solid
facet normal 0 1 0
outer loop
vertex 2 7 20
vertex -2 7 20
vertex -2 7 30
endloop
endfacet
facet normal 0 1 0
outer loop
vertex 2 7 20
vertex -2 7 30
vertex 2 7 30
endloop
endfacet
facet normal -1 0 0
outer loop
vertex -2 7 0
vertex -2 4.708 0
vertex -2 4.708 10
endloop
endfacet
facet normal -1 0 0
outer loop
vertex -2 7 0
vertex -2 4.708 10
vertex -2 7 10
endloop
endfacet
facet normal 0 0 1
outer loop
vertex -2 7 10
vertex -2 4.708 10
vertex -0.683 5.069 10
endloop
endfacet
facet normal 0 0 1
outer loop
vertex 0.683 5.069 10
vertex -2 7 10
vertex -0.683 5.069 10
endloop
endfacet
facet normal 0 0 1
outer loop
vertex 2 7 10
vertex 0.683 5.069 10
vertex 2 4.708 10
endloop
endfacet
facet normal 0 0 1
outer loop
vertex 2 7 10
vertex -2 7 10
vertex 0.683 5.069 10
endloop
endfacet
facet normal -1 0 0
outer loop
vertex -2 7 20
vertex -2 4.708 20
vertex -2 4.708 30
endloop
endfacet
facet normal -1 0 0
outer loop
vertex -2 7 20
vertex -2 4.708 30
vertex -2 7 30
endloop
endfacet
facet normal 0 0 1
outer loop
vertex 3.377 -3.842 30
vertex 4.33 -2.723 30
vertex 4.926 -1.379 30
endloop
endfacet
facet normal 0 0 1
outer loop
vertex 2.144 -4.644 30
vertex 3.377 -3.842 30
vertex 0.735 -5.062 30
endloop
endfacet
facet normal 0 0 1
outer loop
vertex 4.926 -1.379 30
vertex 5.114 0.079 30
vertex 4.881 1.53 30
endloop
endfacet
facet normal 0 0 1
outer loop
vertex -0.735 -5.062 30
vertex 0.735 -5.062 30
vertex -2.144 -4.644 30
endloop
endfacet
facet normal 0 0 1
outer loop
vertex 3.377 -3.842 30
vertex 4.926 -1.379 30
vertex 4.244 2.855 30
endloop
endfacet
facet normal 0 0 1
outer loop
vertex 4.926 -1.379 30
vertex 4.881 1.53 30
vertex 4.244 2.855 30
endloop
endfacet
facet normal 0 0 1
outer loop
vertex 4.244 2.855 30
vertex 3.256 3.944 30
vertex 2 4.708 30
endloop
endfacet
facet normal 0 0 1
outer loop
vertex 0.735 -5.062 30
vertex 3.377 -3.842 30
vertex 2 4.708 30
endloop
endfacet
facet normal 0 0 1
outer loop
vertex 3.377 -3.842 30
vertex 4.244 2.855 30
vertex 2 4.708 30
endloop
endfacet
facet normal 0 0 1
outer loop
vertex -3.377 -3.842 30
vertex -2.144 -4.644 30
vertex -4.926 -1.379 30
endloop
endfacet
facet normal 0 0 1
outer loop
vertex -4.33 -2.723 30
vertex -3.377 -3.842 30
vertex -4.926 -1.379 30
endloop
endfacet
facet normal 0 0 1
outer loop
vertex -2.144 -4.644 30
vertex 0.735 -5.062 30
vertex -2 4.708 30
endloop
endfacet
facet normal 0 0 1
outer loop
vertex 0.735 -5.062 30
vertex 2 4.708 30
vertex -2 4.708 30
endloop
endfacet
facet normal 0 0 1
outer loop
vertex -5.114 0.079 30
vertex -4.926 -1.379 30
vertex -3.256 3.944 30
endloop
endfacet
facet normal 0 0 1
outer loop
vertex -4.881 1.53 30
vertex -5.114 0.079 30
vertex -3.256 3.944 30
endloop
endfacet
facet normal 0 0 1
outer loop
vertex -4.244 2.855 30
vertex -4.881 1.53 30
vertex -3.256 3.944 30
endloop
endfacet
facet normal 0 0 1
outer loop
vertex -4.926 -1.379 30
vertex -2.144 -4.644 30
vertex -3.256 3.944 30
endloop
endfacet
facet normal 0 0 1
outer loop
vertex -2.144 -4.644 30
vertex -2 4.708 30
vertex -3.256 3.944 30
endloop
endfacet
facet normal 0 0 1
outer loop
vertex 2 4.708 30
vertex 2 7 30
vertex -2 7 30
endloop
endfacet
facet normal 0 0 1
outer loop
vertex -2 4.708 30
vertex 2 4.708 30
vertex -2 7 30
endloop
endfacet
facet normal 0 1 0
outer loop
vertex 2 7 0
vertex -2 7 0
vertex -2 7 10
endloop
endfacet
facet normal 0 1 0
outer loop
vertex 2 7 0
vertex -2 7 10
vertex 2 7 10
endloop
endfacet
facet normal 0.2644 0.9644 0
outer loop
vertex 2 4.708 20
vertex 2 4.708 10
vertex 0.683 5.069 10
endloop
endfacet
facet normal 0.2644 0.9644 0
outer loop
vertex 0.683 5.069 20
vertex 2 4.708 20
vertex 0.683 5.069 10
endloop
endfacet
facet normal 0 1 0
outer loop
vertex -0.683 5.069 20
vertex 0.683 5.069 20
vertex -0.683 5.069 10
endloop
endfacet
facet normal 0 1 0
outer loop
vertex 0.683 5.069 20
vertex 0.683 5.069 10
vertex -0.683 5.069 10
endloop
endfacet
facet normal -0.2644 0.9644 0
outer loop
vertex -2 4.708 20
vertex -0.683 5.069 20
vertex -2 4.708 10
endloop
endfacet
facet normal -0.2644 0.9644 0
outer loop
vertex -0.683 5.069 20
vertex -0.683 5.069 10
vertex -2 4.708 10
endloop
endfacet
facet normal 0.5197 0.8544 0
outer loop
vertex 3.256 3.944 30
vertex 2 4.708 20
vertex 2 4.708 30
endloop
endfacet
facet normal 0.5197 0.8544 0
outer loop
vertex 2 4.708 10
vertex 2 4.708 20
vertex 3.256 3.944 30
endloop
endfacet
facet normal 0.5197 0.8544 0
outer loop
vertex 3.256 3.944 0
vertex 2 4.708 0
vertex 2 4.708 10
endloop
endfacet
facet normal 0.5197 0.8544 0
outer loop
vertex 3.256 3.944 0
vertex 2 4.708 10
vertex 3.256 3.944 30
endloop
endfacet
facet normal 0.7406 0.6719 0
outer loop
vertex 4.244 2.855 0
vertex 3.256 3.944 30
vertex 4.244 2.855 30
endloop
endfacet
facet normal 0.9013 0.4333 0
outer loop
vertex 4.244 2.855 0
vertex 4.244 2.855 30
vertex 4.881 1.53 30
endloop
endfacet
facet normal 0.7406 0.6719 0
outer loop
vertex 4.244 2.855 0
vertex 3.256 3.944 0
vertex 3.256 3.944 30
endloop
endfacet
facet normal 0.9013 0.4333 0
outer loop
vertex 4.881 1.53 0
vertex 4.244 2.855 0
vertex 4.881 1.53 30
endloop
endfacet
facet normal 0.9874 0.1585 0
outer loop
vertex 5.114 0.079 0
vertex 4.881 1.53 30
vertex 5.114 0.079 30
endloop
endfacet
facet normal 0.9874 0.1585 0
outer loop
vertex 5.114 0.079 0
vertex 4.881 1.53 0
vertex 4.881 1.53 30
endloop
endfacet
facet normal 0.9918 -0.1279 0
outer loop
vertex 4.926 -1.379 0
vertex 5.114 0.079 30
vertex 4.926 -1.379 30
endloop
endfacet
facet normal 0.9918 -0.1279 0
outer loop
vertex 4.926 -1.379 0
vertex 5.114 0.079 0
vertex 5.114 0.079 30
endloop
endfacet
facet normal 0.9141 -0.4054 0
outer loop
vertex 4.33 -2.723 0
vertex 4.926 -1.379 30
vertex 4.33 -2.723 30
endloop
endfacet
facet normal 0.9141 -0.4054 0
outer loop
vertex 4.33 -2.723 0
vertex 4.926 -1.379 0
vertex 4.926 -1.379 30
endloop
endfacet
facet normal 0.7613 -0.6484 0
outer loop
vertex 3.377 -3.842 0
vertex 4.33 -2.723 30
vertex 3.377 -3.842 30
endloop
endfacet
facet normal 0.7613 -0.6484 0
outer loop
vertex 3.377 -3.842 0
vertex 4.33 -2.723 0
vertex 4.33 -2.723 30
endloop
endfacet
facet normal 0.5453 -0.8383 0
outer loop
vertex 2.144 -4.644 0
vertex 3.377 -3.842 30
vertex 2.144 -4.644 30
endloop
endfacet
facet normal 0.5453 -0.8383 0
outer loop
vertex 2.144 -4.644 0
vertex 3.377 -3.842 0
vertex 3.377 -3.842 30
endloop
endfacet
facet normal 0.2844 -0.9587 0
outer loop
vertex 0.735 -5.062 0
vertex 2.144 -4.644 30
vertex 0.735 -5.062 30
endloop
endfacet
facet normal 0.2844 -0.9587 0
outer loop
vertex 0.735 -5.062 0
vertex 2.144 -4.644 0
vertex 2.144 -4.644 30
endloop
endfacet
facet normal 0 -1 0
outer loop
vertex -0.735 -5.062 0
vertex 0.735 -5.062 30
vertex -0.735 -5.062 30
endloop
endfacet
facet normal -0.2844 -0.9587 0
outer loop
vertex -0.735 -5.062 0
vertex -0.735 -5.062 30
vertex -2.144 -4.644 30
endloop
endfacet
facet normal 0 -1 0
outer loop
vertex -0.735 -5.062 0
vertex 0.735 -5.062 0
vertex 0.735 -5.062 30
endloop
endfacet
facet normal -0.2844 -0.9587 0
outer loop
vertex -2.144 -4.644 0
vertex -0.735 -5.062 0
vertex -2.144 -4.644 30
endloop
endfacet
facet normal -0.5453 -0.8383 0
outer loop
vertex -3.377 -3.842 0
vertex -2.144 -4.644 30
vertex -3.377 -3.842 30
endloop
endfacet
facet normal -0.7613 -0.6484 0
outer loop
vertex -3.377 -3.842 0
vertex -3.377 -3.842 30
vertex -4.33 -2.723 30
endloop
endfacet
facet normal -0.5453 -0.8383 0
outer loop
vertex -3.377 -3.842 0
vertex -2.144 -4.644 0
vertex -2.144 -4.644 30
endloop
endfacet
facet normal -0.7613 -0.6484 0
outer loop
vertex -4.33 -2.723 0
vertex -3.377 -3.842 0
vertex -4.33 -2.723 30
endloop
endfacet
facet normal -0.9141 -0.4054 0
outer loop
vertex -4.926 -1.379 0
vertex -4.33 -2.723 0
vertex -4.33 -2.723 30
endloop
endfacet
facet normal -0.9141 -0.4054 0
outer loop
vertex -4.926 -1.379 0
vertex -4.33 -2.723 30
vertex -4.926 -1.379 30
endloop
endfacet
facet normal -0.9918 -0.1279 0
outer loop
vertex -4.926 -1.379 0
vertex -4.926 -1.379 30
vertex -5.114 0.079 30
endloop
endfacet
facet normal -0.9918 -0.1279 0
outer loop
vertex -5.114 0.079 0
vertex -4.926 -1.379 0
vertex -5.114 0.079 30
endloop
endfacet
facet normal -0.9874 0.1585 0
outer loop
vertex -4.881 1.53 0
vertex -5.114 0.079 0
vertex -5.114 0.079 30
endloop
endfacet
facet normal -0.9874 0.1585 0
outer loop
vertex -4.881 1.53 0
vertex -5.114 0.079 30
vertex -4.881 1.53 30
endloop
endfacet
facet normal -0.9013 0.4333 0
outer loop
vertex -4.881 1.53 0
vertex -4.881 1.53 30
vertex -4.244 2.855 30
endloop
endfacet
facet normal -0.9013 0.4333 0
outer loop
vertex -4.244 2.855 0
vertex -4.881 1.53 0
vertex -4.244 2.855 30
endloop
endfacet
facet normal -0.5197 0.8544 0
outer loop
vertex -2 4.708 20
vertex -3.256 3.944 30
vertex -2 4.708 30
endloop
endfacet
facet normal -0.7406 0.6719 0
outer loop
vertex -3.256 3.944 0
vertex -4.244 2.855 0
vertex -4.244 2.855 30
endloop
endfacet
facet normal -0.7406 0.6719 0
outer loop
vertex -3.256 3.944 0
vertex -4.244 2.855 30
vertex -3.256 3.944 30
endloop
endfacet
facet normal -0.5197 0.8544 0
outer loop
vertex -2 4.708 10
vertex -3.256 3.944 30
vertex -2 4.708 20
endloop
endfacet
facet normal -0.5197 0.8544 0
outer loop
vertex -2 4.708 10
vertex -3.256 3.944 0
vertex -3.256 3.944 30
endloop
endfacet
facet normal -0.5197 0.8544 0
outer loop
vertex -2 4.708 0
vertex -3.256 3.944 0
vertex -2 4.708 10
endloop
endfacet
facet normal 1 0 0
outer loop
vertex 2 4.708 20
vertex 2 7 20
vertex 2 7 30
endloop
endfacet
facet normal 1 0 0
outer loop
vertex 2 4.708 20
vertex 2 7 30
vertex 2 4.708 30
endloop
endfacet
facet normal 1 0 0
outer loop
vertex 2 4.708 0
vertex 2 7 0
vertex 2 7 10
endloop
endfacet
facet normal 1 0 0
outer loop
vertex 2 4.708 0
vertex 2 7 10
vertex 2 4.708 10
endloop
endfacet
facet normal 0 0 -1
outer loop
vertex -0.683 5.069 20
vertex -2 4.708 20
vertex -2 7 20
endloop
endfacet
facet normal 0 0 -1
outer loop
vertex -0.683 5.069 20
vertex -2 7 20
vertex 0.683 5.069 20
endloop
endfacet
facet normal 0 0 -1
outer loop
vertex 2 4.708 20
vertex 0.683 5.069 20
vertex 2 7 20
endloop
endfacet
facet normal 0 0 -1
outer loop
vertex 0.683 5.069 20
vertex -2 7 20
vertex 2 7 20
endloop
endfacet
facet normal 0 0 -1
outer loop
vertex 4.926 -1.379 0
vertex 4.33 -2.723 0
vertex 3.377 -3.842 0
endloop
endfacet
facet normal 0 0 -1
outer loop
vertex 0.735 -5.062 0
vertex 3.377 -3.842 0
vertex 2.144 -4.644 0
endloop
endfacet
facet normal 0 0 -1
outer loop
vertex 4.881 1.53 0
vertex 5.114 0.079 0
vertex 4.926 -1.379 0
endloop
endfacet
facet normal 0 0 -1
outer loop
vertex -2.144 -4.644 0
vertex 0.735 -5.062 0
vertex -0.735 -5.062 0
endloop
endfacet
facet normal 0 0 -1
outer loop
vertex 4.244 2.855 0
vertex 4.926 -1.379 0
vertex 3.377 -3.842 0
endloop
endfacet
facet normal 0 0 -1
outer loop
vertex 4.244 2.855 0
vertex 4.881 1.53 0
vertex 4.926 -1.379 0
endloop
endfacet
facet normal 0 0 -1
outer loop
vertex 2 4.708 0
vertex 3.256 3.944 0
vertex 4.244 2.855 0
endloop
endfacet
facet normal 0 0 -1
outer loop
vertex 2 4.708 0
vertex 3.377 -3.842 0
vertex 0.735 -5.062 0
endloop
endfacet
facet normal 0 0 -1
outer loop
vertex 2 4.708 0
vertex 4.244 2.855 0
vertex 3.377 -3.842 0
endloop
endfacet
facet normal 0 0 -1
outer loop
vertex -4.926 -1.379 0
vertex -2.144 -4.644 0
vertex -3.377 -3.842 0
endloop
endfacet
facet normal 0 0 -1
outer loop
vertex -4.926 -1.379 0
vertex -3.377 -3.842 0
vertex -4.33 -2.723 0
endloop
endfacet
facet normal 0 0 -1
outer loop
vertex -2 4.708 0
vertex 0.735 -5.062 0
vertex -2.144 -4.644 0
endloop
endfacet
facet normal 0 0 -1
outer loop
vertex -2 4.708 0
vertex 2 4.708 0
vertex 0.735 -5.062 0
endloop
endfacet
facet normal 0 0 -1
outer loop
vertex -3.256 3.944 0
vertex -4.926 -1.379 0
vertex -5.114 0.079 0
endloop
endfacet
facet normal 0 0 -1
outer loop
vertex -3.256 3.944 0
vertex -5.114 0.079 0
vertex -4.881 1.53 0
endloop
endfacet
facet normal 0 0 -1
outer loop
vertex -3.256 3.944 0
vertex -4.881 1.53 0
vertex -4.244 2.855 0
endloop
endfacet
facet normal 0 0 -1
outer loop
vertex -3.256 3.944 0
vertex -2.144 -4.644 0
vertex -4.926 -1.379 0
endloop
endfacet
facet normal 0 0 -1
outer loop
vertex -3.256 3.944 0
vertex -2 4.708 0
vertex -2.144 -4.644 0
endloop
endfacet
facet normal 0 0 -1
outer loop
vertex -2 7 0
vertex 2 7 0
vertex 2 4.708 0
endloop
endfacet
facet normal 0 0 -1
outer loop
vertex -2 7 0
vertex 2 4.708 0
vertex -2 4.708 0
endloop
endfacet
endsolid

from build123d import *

# Parameters (mm, degrees)
BOSS_EXTRUDE1_DEPTH = 30
CUT_EXTRUDE1_START  = -20
SKETCH2_R           = 7.822470446
SKETCH2_R_2         = 5.115
CUT_EXTRUDE1_DEPTH  = 10


with BuildPart() as part:
    # Sketch1 → Boss-Extrude1 (new body)
    with BuildSketch(Plane.XY):
        with BuildLine():
            Line((-2, 4.707783449), (-2, 7))
            Line((-2, 7), (2, 7))
            Line((2, 7), (2, 4.707783449))
            ThreePointArc((2, 4.707783449), (0, -5.115), (-2, 4.707783449))
        make_face()
    extrude(amount=BOSS_EXTRUDE1_DEPTH)

    # Sketch2 → Cut-Extrude1 (cut)
    with BuildSketch(Plane.XY.offset(30).offset(CUT_EXTRUDE1_START)):
        Circle(SKETCH2_R)
        with Locations(Location((0, 0, 0), (0, 0, 113.017162604))):
            Circle(SKETCH2_R_2, mode=Mode.SUBTRACT)
    extrude(amount=CUT_EXTRUDE1_DEPTH, mode=Mode.SUBTRACT)


solid = part.part
